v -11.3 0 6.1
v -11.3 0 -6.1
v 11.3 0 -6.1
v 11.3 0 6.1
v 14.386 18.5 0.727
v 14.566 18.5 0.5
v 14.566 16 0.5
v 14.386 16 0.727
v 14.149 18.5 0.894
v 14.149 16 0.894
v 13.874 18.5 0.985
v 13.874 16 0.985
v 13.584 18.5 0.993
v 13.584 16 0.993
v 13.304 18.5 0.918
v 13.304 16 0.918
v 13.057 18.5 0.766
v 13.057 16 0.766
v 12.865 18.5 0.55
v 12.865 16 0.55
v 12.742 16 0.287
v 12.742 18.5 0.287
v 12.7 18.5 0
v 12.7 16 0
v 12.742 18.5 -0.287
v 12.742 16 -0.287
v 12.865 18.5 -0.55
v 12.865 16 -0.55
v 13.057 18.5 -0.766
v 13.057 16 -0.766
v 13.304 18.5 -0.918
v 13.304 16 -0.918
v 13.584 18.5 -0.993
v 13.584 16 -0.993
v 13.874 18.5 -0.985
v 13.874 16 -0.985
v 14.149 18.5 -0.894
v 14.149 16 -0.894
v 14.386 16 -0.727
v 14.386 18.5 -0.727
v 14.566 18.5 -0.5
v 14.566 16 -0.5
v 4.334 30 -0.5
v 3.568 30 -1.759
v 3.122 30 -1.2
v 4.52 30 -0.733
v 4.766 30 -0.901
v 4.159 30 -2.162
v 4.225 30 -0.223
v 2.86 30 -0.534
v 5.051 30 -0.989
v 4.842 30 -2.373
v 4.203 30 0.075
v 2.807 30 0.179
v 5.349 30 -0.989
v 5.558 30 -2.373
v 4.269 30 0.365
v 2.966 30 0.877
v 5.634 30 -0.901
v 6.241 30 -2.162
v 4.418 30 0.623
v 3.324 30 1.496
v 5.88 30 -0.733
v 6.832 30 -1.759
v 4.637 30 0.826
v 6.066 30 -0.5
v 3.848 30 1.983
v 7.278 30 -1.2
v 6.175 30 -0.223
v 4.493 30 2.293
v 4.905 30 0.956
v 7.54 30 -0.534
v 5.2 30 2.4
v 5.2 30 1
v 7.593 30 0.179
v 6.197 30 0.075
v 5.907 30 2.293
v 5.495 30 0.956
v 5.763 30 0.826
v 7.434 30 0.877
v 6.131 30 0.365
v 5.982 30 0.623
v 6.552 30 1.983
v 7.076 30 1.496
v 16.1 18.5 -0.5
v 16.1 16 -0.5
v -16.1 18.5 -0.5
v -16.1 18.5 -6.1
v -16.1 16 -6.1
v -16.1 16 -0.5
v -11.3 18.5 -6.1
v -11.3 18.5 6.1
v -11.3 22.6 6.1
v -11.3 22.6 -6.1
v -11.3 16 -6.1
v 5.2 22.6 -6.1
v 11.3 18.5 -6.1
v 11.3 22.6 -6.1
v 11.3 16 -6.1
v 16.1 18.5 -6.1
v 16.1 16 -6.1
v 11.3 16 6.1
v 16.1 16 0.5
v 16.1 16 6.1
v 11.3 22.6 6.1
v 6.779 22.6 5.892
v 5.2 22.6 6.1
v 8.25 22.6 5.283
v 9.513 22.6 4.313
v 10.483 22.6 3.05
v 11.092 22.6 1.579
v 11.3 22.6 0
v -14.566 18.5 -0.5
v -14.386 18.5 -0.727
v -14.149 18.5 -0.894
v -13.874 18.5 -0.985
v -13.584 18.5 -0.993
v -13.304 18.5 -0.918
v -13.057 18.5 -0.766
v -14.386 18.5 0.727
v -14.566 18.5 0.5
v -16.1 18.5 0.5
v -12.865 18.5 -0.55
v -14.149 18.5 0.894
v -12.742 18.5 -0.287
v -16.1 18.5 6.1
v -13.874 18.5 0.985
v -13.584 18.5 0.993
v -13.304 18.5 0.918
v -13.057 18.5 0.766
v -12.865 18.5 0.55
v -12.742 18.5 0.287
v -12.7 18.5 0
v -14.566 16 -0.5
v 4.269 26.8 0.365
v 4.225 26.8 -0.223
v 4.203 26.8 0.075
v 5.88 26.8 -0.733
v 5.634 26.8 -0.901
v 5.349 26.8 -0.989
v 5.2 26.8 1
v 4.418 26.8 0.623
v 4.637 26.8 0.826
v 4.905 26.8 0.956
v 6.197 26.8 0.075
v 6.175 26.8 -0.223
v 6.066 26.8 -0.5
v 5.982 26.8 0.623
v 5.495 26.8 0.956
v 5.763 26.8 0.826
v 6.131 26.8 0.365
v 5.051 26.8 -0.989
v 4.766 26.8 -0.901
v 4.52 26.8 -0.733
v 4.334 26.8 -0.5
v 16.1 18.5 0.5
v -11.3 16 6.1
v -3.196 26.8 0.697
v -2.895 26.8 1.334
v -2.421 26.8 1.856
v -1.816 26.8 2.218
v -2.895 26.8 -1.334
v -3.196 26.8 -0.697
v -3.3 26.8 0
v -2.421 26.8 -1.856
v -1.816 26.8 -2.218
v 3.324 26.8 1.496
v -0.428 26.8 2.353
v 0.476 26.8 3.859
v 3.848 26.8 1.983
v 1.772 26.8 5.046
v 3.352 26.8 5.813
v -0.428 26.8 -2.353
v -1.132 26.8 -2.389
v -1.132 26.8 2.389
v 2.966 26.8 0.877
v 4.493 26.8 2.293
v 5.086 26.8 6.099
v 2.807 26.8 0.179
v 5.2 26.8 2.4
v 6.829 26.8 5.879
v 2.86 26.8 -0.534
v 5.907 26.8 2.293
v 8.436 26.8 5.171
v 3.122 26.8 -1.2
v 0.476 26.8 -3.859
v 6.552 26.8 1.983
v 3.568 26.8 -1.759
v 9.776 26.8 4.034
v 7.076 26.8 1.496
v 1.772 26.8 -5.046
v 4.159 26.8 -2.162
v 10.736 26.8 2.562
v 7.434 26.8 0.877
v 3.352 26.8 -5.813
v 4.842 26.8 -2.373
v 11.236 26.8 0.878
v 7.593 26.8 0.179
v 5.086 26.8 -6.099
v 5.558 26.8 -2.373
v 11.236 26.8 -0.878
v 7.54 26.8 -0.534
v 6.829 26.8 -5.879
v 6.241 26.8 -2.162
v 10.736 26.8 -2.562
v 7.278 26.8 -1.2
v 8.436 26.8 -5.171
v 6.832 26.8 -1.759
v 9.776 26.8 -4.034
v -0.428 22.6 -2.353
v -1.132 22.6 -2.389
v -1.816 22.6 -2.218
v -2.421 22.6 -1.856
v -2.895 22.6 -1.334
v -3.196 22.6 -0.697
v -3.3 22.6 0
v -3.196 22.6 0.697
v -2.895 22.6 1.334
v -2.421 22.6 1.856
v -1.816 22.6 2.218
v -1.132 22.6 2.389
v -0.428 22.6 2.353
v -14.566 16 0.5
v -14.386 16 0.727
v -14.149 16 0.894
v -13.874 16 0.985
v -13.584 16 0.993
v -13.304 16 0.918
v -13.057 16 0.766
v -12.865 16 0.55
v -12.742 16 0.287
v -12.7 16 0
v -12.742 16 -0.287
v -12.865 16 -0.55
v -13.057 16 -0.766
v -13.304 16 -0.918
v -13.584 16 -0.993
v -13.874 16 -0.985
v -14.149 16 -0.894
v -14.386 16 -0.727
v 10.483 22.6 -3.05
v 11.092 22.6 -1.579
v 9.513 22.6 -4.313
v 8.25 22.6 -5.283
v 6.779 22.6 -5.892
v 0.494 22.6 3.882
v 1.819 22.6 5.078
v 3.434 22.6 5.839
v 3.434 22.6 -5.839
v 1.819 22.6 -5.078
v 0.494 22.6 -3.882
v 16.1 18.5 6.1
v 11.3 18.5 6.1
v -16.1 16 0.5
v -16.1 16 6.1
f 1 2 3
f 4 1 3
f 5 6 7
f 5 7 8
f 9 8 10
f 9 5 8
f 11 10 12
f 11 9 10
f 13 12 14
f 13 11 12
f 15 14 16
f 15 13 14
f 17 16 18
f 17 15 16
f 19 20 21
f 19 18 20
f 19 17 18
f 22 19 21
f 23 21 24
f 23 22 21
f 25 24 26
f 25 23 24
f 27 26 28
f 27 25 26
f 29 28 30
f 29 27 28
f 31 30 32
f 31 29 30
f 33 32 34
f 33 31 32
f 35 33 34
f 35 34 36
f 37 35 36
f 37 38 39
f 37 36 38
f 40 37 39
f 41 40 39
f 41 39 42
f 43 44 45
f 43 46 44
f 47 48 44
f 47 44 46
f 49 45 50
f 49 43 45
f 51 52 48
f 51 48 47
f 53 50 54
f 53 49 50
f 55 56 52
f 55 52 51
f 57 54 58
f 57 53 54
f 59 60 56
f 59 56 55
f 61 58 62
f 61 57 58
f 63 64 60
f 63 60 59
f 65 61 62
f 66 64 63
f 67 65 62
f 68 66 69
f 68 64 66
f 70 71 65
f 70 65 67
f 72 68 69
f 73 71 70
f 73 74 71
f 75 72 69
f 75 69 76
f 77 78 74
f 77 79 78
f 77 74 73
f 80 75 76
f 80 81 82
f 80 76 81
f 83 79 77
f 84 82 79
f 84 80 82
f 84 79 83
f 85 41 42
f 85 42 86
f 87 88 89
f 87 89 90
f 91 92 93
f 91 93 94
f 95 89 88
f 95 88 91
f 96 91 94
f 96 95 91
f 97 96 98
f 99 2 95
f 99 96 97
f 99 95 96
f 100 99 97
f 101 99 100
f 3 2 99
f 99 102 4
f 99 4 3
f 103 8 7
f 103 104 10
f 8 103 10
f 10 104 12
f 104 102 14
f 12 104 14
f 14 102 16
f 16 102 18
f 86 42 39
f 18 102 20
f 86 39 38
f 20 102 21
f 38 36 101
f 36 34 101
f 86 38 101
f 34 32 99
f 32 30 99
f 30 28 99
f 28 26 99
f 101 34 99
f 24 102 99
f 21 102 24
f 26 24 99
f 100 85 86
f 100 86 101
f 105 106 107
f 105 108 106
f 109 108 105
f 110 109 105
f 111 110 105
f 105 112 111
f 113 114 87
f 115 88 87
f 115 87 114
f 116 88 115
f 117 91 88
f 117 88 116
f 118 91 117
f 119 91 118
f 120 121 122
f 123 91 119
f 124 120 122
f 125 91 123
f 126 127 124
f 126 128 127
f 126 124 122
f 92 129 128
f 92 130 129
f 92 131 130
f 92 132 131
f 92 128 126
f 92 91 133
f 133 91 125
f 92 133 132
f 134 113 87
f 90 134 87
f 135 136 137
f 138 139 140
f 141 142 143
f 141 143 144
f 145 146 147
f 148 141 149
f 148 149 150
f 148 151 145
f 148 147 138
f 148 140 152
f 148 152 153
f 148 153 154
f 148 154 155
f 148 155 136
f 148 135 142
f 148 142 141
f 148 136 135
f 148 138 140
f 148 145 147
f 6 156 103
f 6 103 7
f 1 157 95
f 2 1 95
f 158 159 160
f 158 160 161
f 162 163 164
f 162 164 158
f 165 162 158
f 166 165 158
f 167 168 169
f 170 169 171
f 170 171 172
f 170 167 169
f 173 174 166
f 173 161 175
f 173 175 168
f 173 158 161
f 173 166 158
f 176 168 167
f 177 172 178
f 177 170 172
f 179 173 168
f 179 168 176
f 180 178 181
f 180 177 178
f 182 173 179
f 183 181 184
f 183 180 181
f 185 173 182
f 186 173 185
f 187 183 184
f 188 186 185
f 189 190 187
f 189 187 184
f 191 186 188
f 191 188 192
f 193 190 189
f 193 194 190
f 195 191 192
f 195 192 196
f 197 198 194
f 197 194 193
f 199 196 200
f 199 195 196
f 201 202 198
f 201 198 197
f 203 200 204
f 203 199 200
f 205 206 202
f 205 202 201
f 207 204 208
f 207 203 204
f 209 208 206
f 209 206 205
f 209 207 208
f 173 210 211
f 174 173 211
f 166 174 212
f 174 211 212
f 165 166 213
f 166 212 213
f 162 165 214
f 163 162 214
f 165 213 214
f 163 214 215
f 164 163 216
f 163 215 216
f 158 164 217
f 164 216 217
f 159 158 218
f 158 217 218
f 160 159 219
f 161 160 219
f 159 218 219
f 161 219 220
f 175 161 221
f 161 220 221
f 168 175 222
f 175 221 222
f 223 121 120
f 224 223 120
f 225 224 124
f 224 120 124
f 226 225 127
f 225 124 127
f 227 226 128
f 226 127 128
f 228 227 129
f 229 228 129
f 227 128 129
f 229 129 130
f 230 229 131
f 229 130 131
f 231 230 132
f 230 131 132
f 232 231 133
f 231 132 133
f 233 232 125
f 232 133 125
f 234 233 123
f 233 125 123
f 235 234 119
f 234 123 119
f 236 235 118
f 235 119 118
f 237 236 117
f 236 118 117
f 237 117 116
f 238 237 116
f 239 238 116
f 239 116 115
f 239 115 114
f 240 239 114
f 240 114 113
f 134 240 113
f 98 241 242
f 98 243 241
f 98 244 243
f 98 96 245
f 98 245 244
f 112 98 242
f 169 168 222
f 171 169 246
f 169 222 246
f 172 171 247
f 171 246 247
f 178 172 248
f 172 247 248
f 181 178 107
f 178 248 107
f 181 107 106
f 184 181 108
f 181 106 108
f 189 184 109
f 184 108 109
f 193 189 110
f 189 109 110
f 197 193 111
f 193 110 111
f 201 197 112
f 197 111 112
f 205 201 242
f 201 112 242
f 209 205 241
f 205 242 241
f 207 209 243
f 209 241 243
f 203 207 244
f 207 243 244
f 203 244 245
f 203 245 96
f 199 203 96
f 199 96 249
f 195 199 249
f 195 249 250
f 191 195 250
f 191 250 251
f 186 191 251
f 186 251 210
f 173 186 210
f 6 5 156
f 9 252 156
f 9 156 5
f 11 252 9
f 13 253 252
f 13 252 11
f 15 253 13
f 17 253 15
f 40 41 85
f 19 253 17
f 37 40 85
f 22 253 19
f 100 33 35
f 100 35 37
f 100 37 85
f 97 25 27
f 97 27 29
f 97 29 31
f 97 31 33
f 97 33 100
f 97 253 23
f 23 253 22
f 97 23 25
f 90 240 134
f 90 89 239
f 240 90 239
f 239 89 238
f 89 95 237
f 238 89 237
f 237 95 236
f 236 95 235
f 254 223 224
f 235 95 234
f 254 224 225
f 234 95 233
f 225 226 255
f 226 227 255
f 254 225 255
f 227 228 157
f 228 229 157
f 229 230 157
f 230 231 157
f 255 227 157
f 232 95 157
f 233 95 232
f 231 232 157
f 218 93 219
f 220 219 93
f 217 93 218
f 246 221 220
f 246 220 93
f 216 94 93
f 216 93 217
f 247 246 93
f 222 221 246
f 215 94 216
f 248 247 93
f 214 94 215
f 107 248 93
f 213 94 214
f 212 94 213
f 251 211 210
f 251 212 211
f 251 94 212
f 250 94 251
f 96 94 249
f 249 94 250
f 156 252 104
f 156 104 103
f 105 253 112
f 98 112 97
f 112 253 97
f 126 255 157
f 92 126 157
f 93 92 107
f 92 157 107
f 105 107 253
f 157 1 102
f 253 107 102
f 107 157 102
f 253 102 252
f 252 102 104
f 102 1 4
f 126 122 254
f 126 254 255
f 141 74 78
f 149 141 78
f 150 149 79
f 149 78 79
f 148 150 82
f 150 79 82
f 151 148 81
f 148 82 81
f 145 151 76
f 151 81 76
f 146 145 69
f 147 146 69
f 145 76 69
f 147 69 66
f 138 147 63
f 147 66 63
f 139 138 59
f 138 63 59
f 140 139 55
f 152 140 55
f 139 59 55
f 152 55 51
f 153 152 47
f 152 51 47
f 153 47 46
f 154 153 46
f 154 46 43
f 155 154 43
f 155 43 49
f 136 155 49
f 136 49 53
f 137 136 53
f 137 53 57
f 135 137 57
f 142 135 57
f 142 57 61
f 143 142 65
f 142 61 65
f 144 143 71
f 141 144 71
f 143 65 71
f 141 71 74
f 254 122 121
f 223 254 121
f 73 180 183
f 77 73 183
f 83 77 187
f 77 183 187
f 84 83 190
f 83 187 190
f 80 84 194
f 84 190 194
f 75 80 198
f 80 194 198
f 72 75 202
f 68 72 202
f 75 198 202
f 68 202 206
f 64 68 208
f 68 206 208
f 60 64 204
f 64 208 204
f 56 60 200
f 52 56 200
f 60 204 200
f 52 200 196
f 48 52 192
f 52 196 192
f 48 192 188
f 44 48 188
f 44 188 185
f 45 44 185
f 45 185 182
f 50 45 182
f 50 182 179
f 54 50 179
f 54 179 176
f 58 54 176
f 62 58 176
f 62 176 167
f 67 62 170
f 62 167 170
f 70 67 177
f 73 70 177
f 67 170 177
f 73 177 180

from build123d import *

# Parameters (mm, degrees)
SKETCH1_W           = 22.6
SKETCH1_H           = 12.2
BOSS_EXTRUDE1_DEPTH = 22.6
SKETCH4_W           = 12.2
SKETCH4_H           = 2.5
BOSS_EXTRUDE2_DEPTH = 4.8
SKETCH5_W           = 12.2
SKETCH5_H           = 2.5
BOSS_EXTRUDE3_DEPTH = 4.8
BOSS_EXTRUDE4_DEPTH = 4.2
SKETCH9_R           = 2.4
BOSS_EXTRUDE5_DEPTH = 3.2
SKETCH10_R          = 1
CUT_EXTRUDE1_DEPTH  = 3.2
CUT_EXTRUDE2_DEPTH  = 26.271921177
CUT_EXTRUDE3_DEPTH  = 26.271921177


with BuildPart() as part:
    # Sketch1 → Boss-Extrude1 (new body)
    with BuildSketch(Plane(origin=(0, 0, 0), x_dir=(1, 0, 0), z_dir=(0, 1, 0))):
        Rectangle(SKETCH1_W, SKETCH1_H)
    extrude(amount=BOSS_EXTRUDE1_DEPTH)

    # Sketch4 → Boss-Extrude2 (add)
    with BuildSketch(Plane.ZY.offset(11.3)):
        with Locations((0, 17.25)):
            Rectangle(SKETCH4_W, SKETCH4_H)
    extrude(amount=BOSS_EXTRUDE2_DEPTH)

    # Sketch5 → Boss-Extrude3 (add)
    with BuildSketch(Plane(origin=(11.3, 0, 0), x_dir=(0, 0, -1), z_dir=(1, 0, 0))):
        with Locations((0, 17.25)):
            Rectangle(SKETCH5_W, SKETCH5_H)
    extrude(amount=BOSS_EXTRUDE3_DEPTH)

    # Sketch8 → Boss-Extrude4 (add)
    with BuildSketch(Plane(origin=(0, 22.6, 0), x_dir=(1, 0, 0), z_dir=(0, 1, 0))):
        with BuildLine():
            ThreePointArc((-0.427868852, -2.353102671), (11.3, 0), (-0.427868852, 2.353102671))
            ThreePointArc((-0.427868852, 2.353102671), (-3.3, 0), (-0.427868852, -2.353102671))
        make_face()
    extrude(amount=BOSS_EXTRUDE4_DEPTH)

    # Sketch9 → Boss-Extrude5 (add)
    with BuildSketch(Plane(origin=(0, 26.8, 0), x_dir=(1, 0, 0), z_dir=(0, 1, 0))):
        with Locations(Location((5.2, 0, 0), (0, 0, 270))):
            Circle(SKETCH9_R)
    extrude(amount=BOSS_EXTRUDE5_DEPTH)

    # Sketch10 → Cut-Extrude1 (cut)
    with BuildSketch(Plane(origin=(0, 30, 0), x_dir=(1, 0, 0), z_dir=(0, 1, 0))):
        with Locations(Location((5.2, 0, 0), (0, 0, 270))):
            Circle(SKETCH10_R)
    extrude(amount=-CUT_EXTRUDE1_DEPTH, mode=Mode.SUBTRACT)

    # Sketch12 → Cut-Extrude2 (cut, through all)
    with BuildSketch(Plane(origin=(0, 18.5, 0), x_dir=(1, 0, 0), z_dir=(0, 1, 0))):
        with BuildLine():
            Line((16.1, 0.5), (16.1, -0.5))
            Line((16.1, -0.5), (14.566025404, -0.5))
            ThreePointArc((14.566025404, -0.5), (12.7, 0), (14.566025404, 0.5))
            Line((14.566025404, 0.5), (16.1, 0.5))
        make_face()
    extrude(amount=-CUT_EXTRUDE2_DEPTH, mode=Mode.SUBTRACT)

    # Sketch13 → Cut-Extrude3 (cut, through all)
    with BuildSketch(Plane(origin=(0, 18.5, 0), x_dir=(1, 0, 0), z_dir=(0, 1, 0))):
        with BuildLine():
            Line((-16.1, 0.5), (-16.1, -0.5))
            Line((-16.1, -0.5), (-14.566025404, -0.5))
            ThreePointArc((-14.566025404, -0.5), (-12.7, 0), (-14.566025404, 0.5))
            Line((-14.566025404, 0.5), (-16.1, 0.5))
        make_face()
    extrude(amount=-CUT_EXTRUDE3_DEPTH, mode=Mode.SUBTRACT)


solid = part.part
